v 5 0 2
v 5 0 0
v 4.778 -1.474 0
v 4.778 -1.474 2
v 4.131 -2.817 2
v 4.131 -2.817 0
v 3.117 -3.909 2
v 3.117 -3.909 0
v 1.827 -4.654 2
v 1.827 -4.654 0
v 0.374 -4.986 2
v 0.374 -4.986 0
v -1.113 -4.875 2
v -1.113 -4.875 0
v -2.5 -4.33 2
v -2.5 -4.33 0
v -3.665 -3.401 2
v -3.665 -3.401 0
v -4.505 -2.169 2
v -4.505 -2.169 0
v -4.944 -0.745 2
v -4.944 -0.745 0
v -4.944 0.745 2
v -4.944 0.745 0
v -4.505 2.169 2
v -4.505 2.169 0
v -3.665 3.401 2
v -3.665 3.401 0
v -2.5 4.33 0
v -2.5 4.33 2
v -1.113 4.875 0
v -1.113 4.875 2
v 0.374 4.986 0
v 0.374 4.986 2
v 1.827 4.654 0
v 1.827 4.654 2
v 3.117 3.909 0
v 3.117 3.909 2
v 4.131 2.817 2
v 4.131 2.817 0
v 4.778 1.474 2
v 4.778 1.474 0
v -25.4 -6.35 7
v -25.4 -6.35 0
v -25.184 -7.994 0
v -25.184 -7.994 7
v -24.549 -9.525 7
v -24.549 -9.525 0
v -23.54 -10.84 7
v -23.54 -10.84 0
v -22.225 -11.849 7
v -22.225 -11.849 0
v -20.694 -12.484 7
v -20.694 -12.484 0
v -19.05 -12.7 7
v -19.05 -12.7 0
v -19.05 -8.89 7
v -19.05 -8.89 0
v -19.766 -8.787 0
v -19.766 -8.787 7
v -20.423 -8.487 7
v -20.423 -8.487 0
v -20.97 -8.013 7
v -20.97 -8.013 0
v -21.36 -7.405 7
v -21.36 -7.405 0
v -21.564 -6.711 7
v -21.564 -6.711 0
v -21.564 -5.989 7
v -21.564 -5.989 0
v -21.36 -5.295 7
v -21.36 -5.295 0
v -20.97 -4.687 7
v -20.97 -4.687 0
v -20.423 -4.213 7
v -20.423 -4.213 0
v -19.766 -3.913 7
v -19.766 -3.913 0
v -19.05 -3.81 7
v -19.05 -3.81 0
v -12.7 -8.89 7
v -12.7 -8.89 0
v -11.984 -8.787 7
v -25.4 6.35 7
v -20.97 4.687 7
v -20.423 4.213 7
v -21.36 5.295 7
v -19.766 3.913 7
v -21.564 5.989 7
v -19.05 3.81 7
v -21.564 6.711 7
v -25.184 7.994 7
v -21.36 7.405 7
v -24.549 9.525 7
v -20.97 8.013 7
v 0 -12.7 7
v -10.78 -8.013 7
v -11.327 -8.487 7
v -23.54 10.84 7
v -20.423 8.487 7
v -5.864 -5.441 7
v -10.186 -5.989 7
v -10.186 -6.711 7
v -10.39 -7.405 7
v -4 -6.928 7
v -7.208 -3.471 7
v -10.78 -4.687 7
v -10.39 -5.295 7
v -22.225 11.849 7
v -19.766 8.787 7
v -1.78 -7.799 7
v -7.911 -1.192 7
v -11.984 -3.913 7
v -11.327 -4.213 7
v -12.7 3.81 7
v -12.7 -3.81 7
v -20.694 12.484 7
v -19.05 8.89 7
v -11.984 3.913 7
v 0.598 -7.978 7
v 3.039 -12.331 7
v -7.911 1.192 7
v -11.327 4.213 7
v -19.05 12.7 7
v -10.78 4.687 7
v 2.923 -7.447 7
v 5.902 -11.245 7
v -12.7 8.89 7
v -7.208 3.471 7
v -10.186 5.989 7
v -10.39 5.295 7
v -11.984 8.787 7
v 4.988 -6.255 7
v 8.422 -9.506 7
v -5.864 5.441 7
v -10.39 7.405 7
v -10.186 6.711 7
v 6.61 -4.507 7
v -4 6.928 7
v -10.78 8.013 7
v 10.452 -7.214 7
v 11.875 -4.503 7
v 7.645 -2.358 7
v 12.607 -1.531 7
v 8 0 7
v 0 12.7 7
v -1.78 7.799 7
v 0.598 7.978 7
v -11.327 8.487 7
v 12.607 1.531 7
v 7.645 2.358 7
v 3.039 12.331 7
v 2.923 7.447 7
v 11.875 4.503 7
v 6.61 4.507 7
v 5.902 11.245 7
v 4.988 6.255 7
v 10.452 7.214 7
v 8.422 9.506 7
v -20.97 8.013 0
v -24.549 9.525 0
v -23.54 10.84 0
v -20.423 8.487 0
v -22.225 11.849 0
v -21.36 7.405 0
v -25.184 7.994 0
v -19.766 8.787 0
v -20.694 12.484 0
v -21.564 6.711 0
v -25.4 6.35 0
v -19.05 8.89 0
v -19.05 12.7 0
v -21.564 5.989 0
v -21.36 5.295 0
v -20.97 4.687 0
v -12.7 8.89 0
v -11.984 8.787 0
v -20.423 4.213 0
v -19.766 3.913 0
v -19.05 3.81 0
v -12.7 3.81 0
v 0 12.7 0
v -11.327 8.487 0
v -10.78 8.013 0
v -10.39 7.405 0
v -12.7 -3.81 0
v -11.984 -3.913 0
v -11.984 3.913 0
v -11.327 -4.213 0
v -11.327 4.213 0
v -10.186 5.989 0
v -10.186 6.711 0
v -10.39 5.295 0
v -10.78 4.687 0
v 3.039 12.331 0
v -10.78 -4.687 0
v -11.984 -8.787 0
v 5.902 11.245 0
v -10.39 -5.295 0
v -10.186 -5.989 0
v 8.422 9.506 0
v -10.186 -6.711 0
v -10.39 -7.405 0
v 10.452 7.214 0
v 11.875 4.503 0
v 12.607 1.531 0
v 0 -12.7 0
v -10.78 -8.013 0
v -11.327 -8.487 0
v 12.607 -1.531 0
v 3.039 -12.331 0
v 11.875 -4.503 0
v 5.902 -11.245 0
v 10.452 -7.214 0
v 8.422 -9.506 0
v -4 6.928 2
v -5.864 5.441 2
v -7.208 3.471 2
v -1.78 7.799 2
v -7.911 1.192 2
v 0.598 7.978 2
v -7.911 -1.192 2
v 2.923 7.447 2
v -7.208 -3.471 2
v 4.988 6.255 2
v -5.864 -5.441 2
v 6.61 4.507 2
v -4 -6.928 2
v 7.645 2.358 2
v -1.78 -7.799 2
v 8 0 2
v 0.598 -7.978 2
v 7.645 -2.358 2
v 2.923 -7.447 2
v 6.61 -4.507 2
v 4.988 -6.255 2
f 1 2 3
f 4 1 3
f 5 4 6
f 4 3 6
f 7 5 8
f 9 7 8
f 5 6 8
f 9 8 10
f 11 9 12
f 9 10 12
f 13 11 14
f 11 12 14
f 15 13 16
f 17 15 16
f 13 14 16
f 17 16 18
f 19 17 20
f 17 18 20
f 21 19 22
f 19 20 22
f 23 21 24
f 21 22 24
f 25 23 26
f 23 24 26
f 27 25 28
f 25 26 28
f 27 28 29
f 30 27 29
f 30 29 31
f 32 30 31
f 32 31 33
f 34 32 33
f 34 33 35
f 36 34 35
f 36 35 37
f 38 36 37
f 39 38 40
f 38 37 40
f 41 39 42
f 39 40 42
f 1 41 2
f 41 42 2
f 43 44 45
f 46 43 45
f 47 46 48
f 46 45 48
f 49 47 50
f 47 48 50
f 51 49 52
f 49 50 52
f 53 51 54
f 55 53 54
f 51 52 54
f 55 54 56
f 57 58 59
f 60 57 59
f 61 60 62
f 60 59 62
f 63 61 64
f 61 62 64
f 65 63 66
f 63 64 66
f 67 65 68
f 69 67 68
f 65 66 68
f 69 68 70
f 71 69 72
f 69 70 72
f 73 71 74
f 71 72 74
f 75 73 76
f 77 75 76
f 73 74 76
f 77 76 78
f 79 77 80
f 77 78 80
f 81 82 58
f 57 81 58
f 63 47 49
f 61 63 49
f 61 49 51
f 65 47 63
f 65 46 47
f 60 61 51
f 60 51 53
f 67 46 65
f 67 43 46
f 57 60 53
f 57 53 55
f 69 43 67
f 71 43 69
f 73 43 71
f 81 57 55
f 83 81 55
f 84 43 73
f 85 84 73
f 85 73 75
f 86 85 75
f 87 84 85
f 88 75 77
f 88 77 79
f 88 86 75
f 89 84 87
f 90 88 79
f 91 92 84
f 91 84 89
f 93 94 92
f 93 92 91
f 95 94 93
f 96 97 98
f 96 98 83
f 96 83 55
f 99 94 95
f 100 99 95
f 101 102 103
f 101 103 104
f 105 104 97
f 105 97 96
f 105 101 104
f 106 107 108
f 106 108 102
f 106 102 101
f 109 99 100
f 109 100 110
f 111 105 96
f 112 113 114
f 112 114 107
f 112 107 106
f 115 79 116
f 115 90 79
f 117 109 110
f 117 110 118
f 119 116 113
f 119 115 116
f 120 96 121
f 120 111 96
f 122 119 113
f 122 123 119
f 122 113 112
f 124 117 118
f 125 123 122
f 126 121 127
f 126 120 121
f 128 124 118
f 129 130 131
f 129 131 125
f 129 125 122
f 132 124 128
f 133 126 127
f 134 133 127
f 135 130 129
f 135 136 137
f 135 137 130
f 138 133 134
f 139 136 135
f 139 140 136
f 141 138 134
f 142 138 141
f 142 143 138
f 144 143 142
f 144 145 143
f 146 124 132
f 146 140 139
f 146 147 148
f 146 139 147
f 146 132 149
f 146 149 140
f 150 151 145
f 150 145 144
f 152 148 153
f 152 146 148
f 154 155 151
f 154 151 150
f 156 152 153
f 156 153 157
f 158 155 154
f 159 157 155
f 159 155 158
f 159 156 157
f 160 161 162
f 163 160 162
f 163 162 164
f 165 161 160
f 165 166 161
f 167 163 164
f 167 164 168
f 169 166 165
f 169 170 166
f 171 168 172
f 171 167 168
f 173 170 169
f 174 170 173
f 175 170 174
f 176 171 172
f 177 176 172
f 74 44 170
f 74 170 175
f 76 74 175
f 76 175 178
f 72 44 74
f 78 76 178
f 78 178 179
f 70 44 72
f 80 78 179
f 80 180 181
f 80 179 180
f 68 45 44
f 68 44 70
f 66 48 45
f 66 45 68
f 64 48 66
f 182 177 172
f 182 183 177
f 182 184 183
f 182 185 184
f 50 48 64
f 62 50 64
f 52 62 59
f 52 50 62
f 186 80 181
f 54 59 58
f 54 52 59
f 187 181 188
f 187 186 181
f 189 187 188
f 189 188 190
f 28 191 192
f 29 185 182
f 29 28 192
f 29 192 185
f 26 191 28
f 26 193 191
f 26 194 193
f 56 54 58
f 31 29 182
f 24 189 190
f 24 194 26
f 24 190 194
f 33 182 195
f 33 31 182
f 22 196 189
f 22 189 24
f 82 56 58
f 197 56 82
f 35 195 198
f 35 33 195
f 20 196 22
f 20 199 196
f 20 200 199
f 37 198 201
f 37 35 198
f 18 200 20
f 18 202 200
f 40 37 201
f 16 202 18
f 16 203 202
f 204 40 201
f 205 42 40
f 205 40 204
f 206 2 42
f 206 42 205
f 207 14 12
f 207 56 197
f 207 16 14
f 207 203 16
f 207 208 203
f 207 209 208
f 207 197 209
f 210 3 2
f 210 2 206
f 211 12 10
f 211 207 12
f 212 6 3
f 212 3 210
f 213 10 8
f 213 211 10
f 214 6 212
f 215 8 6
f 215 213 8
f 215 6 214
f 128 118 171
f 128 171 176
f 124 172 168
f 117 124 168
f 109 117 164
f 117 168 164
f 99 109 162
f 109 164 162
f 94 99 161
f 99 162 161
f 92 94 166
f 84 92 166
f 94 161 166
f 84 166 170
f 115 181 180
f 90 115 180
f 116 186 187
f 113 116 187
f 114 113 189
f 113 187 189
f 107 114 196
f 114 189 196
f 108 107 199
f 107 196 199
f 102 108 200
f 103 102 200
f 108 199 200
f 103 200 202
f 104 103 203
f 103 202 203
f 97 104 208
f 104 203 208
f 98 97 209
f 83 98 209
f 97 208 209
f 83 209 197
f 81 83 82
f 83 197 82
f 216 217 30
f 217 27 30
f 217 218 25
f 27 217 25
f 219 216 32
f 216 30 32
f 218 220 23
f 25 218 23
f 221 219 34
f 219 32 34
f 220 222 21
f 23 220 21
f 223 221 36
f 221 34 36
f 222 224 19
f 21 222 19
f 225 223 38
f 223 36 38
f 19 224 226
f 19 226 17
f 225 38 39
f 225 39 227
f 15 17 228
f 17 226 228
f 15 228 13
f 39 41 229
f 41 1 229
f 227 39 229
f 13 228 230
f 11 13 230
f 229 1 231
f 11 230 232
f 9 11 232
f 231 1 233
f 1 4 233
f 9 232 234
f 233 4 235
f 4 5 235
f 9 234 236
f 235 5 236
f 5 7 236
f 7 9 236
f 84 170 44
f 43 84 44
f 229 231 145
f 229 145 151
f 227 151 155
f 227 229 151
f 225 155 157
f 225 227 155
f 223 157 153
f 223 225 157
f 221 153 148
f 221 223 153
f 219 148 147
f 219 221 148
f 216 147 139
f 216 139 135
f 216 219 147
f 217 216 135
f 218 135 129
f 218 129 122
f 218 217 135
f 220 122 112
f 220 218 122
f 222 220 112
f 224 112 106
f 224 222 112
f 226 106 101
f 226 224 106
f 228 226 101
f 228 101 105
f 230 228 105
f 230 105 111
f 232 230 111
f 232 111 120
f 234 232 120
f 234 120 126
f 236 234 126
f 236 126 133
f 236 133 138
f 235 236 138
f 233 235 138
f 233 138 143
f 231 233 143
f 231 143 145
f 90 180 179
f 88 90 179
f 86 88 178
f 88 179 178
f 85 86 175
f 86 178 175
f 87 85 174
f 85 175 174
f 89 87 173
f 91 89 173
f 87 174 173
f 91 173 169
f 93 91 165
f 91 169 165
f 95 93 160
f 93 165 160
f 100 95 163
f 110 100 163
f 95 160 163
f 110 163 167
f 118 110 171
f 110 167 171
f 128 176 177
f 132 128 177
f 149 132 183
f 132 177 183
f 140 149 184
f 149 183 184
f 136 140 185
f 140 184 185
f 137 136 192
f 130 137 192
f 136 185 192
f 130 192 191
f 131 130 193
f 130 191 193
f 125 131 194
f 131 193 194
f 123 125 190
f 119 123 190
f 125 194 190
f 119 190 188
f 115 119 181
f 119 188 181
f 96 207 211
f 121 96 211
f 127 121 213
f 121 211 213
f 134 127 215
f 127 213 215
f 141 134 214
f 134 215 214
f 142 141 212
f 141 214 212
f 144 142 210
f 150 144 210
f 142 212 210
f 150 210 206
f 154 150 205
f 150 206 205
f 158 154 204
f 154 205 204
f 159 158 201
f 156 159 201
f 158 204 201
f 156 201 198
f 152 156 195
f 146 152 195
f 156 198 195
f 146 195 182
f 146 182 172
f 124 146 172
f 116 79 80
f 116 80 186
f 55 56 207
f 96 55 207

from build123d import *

# Parameters (mm, degrees)
F0_R     = 8
F1_DEPTH = 7
F2_R     = 8
F2_R_2   = 5
F3_DEPTH = 2


with BuildPart() as f1:
    # F0 (on Top) → F1 (new body)
    with BuildSketch(Plane.XY):
        with BuildLine():
            ThreePointArc((0, -12.7), (12.7, 0), (0, 12.7))
            Line((0, 12.7), (-19.05, 12.7))
            ThreePointArc((-19.05, 12.7), (-23.540128, 10.840128), (-25.4, 6.35))
            Line((-25.4, 6.35), (-25.4, -6.35))
            ThreePointArc((-25.4, -6.35), (-23.540128, -10.840128), (-19.05, -12.7))
            Line((-19.05, -12.7), (0, -12.7))
        make_face()
        with BuildLine():
            Line((-12.7, -8.89), (-19.05, -8.89))
            ThreePointArc((-19.05, -8.89), (-21.59, -6.35), (-19.05, -3.81))
            Line((-19.05, -3.81), (-12.7, -3.81))
            ThreePointArc((-12.7, -3.81), (-10.16, -6.35), (-12.7, -8.89))
        make_face(mode=Mode.SUBTRACT)
        Circle(F0_R, mode=Mode.SUBTRACT)
        with BuildLine():
            Line((-12.7, 3.81), (-19.05, 3.81))
            ThreePointArc((-19.05, 3.81), (-21.59, 6.35), (-19.05, 8.89))
            Line((-19.05, 8.89), (-12.7, 8.89))
            ThreePointArc((-12.7, 8.89), (-10.16, 6.35), (-12.7, 3.81))
        make_face(mode=Mode.SUBTRACT)
    extrude(amount=F1_DEPTH)

    # F2 (on face) → F3 (join)
    with BuildSketch(Plane(origin=(0, 0, 0), x_dir=(1, 0, 0), z_dir=(0, 0, -1))):
        Circle(F2_R)
        Circle(F2_R_2, mode=Mode.SUBTRACT)
    extrude(amount=-F3_DEPTH)


solid = f1.part
